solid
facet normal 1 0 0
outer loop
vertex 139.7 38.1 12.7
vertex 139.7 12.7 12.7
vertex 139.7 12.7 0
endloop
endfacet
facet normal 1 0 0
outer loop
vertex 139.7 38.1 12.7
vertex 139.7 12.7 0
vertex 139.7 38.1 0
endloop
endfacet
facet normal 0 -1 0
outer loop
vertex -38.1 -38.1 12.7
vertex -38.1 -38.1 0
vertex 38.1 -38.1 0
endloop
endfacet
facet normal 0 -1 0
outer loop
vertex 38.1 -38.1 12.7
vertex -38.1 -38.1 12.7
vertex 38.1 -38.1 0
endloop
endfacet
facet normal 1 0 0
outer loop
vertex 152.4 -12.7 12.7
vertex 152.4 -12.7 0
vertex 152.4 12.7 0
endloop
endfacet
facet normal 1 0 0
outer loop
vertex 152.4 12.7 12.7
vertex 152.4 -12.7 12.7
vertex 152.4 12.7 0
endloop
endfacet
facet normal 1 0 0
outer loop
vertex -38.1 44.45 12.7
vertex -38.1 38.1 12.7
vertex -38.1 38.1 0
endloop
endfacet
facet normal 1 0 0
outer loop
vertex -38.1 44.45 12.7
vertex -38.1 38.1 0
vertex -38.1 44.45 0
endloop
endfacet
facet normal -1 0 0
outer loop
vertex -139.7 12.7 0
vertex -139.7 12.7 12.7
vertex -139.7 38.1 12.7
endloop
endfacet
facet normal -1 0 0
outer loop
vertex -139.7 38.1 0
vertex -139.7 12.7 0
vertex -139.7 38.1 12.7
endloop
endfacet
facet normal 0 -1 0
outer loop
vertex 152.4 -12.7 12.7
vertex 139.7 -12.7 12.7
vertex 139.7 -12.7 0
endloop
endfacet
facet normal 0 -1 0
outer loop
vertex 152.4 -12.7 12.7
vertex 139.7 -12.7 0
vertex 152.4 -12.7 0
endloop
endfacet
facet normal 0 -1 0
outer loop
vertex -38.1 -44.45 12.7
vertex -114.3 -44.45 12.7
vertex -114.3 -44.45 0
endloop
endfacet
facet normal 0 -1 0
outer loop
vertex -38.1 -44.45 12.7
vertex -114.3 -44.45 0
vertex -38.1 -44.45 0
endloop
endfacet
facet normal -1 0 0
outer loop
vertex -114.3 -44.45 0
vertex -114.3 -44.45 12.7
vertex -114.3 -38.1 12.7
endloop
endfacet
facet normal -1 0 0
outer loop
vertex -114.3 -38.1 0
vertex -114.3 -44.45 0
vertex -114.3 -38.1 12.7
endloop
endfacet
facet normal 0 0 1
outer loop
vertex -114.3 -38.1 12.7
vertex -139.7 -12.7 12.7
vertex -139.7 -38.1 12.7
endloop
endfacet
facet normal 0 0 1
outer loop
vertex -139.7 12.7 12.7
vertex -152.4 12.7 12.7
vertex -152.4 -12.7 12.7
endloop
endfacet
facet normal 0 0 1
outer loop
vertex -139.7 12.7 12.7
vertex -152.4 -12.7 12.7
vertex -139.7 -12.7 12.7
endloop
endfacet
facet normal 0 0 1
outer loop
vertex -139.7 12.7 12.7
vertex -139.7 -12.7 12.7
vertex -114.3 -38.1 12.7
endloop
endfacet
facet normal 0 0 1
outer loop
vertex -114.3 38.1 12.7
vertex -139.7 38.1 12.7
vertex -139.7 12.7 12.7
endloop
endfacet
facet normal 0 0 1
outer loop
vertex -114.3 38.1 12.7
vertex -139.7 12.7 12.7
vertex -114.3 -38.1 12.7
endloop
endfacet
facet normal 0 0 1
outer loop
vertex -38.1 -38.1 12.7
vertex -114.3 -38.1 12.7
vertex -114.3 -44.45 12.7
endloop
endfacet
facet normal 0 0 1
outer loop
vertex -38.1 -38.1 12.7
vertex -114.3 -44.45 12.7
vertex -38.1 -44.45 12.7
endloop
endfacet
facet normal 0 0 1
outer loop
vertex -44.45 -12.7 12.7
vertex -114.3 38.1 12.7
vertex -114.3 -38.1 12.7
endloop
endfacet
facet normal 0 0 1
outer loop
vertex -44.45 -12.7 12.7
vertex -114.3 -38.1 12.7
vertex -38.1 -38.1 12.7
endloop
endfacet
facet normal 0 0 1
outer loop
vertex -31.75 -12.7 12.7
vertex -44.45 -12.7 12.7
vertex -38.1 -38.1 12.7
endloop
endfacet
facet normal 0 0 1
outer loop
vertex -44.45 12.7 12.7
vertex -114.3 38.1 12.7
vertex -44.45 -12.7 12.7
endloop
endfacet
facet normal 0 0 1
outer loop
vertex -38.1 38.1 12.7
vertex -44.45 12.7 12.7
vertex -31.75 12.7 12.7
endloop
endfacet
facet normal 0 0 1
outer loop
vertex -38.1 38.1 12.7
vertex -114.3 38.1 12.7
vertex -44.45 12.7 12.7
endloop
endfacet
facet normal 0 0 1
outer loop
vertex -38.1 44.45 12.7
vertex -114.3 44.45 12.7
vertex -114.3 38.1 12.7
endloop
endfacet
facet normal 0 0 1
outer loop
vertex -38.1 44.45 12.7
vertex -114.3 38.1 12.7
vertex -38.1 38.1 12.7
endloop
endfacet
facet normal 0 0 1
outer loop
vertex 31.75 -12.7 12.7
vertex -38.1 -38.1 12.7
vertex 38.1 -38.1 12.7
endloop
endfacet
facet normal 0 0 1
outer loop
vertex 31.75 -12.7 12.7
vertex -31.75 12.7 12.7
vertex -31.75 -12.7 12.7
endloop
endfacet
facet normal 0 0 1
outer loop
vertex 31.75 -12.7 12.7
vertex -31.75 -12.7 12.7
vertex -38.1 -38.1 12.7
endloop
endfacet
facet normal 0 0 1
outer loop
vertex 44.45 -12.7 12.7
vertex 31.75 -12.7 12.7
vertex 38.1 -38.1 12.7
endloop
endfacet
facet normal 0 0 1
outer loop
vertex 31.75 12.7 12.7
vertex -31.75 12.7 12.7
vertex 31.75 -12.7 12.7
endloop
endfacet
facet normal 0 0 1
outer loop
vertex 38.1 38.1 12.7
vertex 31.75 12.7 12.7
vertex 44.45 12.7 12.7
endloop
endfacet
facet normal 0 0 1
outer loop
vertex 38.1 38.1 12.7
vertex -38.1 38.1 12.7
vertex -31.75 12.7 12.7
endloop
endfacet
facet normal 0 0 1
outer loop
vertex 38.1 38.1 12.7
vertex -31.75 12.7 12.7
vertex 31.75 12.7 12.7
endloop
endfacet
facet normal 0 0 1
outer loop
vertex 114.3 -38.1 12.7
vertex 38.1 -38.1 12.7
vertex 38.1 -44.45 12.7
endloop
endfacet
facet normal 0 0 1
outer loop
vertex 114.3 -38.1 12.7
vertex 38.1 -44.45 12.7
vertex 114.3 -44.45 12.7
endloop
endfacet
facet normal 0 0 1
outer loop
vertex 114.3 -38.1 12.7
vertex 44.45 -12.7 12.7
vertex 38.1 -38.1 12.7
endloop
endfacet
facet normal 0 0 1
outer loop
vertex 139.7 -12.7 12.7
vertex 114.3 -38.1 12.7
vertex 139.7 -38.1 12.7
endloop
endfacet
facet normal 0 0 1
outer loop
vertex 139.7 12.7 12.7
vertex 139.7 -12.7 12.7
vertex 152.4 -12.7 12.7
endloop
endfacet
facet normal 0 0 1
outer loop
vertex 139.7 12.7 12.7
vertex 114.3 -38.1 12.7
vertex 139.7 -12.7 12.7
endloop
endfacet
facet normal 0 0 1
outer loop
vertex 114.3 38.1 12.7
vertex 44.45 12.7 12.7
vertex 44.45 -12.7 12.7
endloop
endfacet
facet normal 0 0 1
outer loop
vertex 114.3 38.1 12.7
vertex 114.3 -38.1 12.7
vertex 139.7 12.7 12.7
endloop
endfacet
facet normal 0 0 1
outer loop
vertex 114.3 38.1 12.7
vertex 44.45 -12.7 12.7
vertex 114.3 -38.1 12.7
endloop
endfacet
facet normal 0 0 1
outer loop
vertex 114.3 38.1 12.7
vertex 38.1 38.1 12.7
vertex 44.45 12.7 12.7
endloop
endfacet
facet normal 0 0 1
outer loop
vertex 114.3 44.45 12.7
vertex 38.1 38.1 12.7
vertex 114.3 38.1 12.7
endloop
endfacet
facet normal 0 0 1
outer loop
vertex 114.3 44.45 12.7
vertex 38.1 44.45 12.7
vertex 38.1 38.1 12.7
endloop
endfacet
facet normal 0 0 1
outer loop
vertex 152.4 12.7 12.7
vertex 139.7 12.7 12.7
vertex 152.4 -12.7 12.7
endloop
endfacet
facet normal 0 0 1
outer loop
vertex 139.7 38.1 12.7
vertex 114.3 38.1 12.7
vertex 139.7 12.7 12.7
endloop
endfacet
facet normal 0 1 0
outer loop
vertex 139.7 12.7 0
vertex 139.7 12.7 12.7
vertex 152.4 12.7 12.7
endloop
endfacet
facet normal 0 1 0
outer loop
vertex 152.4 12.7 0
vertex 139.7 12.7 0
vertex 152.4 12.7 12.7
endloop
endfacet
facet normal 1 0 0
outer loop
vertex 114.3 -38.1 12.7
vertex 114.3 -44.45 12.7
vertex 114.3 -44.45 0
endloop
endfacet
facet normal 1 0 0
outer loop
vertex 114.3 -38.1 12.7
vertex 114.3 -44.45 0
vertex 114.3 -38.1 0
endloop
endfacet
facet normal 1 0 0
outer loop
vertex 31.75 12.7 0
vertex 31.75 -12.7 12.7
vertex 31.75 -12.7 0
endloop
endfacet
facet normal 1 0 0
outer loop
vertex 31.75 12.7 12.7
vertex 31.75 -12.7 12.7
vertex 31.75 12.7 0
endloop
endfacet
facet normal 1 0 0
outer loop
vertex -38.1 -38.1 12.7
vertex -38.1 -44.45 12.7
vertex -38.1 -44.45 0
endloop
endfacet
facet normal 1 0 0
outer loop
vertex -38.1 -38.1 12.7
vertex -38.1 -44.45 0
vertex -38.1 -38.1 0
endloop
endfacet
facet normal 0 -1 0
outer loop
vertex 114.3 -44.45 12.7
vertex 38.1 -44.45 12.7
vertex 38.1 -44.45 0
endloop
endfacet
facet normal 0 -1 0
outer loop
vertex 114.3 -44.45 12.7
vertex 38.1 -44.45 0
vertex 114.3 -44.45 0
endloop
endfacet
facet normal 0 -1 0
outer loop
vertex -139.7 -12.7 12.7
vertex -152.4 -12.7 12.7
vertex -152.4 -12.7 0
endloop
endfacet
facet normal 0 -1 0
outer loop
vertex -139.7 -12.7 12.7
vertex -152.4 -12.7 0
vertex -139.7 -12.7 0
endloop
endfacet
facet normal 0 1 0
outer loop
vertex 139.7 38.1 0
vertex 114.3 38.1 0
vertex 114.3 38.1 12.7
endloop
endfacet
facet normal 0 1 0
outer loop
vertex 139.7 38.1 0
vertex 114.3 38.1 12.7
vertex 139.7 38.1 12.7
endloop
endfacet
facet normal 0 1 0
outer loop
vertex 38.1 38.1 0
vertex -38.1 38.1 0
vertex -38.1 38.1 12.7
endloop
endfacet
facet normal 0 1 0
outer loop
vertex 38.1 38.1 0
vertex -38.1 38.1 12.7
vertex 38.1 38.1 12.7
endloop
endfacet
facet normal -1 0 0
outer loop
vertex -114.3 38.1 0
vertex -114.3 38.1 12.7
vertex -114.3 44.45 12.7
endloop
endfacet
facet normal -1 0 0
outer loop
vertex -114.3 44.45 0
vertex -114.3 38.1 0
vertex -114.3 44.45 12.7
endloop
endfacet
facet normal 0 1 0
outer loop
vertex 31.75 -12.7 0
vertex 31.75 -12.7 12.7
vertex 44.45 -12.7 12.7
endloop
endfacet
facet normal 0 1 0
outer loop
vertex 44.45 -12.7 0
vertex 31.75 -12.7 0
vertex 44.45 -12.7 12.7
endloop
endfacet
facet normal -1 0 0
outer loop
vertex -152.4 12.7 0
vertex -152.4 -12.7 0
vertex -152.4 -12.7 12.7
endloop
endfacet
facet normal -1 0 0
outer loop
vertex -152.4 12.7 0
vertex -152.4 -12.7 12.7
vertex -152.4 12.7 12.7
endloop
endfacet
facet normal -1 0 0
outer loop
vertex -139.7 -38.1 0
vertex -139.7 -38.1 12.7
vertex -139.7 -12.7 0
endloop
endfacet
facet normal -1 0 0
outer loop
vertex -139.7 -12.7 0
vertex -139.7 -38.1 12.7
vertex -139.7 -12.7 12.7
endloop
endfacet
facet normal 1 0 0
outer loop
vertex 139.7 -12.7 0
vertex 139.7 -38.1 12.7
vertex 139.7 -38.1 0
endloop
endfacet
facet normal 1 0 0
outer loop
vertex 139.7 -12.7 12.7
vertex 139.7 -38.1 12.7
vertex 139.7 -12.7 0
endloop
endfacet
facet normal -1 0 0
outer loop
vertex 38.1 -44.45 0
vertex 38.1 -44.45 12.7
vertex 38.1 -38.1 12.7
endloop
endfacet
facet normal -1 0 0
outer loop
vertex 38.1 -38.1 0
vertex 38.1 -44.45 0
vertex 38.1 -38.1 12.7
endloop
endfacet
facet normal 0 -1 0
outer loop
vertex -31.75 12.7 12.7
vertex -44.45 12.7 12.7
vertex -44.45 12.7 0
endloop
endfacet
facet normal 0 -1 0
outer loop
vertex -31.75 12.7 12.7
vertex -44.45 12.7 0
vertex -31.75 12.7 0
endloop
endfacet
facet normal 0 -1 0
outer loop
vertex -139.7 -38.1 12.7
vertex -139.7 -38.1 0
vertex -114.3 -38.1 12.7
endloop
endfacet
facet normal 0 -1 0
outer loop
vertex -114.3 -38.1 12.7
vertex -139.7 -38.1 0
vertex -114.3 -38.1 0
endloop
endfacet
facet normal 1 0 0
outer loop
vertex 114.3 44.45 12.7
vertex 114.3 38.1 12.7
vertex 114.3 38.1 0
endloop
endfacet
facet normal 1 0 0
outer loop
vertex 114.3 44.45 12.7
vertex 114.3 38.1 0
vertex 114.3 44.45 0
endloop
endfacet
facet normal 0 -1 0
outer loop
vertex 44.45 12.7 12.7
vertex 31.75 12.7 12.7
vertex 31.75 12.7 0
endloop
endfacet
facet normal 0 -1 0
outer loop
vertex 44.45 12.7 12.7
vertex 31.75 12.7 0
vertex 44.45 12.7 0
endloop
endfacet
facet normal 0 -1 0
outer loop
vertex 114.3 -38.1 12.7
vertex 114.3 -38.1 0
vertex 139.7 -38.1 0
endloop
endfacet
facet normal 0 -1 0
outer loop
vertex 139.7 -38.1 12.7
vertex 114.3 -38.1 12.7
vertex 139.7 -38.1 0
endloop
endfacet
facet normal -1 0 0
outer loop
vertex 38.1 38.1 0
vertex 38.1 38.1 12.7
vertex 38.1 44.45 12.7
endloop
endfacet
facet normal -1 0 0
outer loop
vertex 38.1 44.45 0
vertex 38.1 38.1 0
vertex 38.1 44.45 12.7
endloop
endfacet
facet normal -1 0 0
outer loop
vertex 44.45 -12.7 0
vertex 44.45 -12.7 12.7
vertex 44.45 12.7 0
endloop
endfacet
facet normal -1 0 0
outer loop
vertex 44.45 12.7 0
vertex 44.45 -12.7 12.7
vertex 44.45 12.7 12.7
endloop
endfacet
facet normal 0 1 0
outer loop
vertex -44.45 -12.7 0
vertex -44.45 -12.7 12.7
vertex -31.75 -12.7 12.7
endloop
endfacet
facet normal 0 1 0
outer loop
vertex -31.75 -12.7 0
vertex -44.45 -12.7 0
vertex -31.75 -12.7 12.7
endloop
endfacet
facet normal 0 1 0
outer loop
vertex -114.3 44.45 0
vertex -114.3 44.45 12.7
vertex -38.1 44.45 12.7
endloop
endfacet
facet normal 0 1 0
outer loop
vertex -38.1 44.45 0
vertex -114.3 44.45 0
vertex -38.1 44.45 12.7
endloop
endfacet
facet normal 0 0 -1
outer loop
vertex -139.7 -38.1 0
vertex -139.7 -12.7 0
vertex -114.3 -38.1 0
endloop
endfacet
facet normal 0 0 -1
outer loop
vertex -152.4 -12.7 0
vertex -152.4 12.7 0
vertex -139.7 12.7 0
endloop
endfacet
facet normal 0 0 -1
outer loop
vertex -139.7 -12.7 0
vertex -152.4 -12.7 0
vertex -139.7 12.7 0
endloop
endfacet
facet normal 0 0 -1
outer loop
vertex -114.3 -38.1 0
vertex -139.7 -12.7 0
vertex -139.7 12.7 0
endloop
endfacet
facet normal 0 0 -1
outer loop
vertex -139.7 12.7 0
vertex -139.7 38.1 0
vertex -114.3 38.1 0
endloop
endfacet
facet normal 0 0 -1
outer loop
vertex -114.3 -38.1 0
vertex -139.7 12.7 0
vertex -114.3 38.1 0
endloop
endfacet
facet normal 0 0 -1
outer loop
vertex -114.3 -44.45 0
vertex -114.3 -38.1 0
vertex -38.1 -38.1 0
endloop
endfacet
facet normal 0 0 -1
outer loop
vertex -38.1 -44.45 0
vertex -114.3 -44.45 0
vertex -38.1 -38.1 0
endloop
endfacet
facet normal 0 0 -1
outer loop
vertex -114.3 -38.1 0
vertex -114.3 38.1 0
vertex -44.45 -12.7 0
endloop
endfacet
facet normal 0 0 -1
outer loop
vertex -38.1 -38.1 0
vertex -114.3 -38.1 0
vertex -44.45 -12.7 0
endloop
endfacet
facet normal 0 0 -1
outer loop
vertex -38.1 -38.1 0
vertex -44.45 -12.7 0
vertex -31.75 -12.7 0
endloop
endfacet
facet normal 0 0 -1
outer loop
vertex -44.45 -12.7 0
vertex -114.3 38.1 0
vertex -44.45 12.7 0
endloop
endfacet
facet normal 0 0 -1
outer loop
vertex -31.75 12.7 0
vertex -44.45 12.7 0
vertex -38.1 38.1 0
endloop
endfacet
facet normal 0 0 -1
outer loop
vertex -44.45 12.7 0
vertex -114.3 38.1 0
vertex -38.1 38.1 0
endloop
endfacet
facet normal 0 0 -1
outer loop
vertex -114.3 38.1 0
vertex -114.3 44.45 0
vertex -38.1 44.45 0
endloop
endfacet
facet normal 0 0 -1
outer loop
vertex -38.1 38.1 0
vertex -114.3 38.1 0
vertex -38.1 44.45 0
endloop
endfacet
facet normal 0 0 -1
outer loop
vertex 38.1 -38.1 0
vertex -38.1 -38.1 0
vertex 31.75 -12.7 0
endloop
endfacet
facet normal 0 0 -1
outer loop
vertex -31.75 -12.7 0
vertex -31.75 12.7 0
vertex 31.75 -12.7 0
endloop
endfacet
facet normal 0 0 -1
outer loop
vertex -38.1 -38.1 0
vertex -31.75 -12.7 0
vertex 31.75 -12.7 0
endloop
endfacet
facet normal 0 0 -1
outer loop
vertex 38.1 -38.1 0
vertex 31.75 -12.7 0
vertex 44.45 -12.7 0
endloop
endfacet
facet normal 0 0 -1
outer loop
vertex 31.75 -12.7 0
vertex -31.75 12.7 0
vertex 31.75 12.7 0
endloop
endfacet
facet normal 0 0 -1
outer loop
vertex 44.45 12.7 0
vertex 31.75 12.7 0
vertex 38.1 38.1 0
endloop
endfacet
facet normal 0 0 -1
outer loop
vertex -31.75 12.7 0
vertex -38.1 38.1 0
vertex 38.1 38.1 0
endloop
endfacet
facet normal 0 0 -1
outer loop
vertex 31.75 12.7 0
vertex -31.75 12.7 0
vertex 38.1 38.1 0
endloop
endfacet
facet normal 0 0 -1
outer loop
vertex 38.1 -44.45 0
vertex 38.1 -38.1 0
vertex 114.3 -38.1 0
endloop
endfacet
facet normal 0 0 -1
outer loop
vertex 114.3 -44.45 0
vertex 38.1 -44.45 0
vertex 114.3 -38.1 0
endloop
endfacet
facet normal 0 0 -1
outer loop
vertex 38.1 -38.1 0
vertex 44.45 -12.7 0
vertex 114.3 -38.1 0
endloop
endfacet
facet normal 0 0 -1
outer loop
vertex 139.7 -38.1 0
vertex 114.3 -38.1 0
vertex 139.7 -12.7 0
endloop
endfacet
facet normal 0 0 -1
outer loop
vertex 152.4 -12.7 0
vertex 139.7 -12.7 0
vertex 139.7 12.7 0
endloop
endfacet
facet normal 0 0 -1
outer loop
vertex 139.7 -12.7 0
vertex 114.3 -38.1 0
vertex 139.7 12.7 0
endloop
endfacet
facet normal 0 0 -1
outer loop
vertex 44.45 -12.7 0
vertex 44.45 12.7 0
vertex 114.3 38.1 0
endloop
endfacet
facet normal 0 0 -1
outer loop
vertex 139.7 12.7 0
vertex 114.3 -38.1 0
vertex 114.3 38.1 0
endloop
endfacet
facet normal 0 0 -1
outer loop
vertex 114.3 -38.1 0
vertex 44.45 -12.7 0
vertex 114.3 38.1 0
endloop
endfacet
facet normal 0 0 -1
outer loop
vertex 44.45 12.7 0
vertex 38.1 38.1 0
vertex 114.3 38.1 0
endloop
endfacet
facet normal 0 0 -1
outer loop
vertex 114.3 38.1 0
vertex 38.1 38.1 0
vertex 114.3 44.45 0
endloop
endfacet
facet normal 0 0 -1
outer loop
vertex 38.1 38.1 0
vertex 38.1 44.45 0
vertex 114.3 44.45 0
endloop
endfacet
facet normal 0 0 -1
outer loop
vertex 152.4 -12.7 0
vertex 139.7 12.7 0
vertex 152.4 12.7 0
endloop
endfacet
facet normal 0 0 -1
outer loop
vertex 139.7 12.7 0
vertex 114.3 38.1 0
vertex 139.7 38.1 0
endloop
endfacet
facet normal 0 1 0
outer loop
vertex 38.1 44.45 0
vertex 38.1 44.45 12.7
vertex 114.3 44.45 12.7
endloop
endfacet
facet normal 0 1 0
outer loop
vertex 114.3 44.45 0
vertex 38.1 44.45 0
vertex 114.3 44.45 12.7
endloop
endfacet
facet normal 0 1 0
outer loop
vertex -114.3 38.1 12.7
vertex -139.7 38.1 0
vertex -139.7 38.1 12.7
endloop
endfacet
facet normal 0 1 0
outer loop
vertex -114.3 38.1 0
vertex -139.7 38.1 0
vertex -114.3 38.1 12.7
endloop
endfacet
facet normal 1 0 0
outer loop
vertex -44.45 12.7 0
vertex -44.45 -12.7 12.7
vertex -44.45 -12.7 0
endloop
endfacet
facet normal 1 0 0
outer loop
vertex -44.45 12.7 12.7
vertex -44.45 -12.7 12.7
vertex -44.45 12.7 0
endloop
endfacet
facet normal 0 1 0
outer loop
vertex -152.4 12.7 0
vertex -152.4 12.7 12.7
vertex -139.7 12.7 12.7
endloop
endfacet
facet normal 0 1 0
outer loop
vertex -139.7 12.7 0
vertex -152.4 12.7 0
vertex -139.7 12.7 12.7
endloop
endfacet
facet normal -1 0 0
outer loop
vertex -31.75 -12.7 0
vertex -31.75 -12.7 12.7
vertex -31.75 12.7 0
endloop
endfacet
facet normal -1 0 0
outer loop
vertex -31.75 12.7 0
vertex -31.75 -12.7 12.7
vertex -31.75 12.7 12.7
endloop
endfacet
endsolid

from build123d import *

# Parameters (mm, degrees)
SKETCH1_W           = 304.8
SKETCH1_H           = 76.2
BOSS_EXTRUDE1_DEPTH = 12.7
SKETCH2_W           = 76.2
SKETCH2_H           = 6.35
BOSS_EXTRUDE2_DEPTH = 12.7
SKETCH3_W           = 12.7
SKETCH3_H           = 25.4
CUT_EXTRUDE1_DEPTH  = 160.257189791


with BuildPart() as part:
    # Sketch1 → Boss-Extrude1 (new body)
    with BuildSketch(Plane.XY):
        Rectangle(SKETCH1_W, SKETCH1_H)
    extrude(amount=BOSS_EXTRUDE1_DEPTH)

    # Sketch2 → Boss-Extrude2 (add)
    with BuildSketch(Plane.XY.offset(12.7)):
        with Locations((-76.2, -41.275)):
            Rectangle(SKETCH2_W, SKETCH2_H)
        with Locations((76.2, -41.275)):
            Rectangle(SKETCH2_W, SKETCH2_H)
        with Locations((76.2, 41.275)):
            Rectangle(SKETCH2_W, SKETCH2_H)
        with Locations((-76.2, 41.275)):
            Rectangle(SKETCH2_W, SKETCH2_H)
    extrude(amount=-BOSS_EXTRUDE2_DEPTH)

    # Sketch3 → Cut-Extrude1 (cut, through all)
    with BuildSketch(Plane.XY.offset(12.7)):
        with Locations((-146.05, -25.4)):
            Rectangle(SKETCH3_W, SKETCH3_H)
        with Locations((-146.05, 25.4)):
            Rectangle(SKETCH3_W, SKETCH3_H)
        with Locations((146.05, 25.4)):
            Rectangle(SKETCH3_W, SKETCH3_H)
        with Locations((146.05, -25.4)):
            Rectangle(SKETCH3_W, SKETCH3_H)
        with Locations((38.1, 0)):
            Rectangle(SKETCH3_W, SKETCH3_H)
        with Locations((-38.1, 0)):
            Rectangle(SKETCH3_W, SKETCH3_H)
    extrude(amount=-CUT_EXTRUDE1_DEPTH, mode=Mode.SUBTRACT)


solid = part.part
